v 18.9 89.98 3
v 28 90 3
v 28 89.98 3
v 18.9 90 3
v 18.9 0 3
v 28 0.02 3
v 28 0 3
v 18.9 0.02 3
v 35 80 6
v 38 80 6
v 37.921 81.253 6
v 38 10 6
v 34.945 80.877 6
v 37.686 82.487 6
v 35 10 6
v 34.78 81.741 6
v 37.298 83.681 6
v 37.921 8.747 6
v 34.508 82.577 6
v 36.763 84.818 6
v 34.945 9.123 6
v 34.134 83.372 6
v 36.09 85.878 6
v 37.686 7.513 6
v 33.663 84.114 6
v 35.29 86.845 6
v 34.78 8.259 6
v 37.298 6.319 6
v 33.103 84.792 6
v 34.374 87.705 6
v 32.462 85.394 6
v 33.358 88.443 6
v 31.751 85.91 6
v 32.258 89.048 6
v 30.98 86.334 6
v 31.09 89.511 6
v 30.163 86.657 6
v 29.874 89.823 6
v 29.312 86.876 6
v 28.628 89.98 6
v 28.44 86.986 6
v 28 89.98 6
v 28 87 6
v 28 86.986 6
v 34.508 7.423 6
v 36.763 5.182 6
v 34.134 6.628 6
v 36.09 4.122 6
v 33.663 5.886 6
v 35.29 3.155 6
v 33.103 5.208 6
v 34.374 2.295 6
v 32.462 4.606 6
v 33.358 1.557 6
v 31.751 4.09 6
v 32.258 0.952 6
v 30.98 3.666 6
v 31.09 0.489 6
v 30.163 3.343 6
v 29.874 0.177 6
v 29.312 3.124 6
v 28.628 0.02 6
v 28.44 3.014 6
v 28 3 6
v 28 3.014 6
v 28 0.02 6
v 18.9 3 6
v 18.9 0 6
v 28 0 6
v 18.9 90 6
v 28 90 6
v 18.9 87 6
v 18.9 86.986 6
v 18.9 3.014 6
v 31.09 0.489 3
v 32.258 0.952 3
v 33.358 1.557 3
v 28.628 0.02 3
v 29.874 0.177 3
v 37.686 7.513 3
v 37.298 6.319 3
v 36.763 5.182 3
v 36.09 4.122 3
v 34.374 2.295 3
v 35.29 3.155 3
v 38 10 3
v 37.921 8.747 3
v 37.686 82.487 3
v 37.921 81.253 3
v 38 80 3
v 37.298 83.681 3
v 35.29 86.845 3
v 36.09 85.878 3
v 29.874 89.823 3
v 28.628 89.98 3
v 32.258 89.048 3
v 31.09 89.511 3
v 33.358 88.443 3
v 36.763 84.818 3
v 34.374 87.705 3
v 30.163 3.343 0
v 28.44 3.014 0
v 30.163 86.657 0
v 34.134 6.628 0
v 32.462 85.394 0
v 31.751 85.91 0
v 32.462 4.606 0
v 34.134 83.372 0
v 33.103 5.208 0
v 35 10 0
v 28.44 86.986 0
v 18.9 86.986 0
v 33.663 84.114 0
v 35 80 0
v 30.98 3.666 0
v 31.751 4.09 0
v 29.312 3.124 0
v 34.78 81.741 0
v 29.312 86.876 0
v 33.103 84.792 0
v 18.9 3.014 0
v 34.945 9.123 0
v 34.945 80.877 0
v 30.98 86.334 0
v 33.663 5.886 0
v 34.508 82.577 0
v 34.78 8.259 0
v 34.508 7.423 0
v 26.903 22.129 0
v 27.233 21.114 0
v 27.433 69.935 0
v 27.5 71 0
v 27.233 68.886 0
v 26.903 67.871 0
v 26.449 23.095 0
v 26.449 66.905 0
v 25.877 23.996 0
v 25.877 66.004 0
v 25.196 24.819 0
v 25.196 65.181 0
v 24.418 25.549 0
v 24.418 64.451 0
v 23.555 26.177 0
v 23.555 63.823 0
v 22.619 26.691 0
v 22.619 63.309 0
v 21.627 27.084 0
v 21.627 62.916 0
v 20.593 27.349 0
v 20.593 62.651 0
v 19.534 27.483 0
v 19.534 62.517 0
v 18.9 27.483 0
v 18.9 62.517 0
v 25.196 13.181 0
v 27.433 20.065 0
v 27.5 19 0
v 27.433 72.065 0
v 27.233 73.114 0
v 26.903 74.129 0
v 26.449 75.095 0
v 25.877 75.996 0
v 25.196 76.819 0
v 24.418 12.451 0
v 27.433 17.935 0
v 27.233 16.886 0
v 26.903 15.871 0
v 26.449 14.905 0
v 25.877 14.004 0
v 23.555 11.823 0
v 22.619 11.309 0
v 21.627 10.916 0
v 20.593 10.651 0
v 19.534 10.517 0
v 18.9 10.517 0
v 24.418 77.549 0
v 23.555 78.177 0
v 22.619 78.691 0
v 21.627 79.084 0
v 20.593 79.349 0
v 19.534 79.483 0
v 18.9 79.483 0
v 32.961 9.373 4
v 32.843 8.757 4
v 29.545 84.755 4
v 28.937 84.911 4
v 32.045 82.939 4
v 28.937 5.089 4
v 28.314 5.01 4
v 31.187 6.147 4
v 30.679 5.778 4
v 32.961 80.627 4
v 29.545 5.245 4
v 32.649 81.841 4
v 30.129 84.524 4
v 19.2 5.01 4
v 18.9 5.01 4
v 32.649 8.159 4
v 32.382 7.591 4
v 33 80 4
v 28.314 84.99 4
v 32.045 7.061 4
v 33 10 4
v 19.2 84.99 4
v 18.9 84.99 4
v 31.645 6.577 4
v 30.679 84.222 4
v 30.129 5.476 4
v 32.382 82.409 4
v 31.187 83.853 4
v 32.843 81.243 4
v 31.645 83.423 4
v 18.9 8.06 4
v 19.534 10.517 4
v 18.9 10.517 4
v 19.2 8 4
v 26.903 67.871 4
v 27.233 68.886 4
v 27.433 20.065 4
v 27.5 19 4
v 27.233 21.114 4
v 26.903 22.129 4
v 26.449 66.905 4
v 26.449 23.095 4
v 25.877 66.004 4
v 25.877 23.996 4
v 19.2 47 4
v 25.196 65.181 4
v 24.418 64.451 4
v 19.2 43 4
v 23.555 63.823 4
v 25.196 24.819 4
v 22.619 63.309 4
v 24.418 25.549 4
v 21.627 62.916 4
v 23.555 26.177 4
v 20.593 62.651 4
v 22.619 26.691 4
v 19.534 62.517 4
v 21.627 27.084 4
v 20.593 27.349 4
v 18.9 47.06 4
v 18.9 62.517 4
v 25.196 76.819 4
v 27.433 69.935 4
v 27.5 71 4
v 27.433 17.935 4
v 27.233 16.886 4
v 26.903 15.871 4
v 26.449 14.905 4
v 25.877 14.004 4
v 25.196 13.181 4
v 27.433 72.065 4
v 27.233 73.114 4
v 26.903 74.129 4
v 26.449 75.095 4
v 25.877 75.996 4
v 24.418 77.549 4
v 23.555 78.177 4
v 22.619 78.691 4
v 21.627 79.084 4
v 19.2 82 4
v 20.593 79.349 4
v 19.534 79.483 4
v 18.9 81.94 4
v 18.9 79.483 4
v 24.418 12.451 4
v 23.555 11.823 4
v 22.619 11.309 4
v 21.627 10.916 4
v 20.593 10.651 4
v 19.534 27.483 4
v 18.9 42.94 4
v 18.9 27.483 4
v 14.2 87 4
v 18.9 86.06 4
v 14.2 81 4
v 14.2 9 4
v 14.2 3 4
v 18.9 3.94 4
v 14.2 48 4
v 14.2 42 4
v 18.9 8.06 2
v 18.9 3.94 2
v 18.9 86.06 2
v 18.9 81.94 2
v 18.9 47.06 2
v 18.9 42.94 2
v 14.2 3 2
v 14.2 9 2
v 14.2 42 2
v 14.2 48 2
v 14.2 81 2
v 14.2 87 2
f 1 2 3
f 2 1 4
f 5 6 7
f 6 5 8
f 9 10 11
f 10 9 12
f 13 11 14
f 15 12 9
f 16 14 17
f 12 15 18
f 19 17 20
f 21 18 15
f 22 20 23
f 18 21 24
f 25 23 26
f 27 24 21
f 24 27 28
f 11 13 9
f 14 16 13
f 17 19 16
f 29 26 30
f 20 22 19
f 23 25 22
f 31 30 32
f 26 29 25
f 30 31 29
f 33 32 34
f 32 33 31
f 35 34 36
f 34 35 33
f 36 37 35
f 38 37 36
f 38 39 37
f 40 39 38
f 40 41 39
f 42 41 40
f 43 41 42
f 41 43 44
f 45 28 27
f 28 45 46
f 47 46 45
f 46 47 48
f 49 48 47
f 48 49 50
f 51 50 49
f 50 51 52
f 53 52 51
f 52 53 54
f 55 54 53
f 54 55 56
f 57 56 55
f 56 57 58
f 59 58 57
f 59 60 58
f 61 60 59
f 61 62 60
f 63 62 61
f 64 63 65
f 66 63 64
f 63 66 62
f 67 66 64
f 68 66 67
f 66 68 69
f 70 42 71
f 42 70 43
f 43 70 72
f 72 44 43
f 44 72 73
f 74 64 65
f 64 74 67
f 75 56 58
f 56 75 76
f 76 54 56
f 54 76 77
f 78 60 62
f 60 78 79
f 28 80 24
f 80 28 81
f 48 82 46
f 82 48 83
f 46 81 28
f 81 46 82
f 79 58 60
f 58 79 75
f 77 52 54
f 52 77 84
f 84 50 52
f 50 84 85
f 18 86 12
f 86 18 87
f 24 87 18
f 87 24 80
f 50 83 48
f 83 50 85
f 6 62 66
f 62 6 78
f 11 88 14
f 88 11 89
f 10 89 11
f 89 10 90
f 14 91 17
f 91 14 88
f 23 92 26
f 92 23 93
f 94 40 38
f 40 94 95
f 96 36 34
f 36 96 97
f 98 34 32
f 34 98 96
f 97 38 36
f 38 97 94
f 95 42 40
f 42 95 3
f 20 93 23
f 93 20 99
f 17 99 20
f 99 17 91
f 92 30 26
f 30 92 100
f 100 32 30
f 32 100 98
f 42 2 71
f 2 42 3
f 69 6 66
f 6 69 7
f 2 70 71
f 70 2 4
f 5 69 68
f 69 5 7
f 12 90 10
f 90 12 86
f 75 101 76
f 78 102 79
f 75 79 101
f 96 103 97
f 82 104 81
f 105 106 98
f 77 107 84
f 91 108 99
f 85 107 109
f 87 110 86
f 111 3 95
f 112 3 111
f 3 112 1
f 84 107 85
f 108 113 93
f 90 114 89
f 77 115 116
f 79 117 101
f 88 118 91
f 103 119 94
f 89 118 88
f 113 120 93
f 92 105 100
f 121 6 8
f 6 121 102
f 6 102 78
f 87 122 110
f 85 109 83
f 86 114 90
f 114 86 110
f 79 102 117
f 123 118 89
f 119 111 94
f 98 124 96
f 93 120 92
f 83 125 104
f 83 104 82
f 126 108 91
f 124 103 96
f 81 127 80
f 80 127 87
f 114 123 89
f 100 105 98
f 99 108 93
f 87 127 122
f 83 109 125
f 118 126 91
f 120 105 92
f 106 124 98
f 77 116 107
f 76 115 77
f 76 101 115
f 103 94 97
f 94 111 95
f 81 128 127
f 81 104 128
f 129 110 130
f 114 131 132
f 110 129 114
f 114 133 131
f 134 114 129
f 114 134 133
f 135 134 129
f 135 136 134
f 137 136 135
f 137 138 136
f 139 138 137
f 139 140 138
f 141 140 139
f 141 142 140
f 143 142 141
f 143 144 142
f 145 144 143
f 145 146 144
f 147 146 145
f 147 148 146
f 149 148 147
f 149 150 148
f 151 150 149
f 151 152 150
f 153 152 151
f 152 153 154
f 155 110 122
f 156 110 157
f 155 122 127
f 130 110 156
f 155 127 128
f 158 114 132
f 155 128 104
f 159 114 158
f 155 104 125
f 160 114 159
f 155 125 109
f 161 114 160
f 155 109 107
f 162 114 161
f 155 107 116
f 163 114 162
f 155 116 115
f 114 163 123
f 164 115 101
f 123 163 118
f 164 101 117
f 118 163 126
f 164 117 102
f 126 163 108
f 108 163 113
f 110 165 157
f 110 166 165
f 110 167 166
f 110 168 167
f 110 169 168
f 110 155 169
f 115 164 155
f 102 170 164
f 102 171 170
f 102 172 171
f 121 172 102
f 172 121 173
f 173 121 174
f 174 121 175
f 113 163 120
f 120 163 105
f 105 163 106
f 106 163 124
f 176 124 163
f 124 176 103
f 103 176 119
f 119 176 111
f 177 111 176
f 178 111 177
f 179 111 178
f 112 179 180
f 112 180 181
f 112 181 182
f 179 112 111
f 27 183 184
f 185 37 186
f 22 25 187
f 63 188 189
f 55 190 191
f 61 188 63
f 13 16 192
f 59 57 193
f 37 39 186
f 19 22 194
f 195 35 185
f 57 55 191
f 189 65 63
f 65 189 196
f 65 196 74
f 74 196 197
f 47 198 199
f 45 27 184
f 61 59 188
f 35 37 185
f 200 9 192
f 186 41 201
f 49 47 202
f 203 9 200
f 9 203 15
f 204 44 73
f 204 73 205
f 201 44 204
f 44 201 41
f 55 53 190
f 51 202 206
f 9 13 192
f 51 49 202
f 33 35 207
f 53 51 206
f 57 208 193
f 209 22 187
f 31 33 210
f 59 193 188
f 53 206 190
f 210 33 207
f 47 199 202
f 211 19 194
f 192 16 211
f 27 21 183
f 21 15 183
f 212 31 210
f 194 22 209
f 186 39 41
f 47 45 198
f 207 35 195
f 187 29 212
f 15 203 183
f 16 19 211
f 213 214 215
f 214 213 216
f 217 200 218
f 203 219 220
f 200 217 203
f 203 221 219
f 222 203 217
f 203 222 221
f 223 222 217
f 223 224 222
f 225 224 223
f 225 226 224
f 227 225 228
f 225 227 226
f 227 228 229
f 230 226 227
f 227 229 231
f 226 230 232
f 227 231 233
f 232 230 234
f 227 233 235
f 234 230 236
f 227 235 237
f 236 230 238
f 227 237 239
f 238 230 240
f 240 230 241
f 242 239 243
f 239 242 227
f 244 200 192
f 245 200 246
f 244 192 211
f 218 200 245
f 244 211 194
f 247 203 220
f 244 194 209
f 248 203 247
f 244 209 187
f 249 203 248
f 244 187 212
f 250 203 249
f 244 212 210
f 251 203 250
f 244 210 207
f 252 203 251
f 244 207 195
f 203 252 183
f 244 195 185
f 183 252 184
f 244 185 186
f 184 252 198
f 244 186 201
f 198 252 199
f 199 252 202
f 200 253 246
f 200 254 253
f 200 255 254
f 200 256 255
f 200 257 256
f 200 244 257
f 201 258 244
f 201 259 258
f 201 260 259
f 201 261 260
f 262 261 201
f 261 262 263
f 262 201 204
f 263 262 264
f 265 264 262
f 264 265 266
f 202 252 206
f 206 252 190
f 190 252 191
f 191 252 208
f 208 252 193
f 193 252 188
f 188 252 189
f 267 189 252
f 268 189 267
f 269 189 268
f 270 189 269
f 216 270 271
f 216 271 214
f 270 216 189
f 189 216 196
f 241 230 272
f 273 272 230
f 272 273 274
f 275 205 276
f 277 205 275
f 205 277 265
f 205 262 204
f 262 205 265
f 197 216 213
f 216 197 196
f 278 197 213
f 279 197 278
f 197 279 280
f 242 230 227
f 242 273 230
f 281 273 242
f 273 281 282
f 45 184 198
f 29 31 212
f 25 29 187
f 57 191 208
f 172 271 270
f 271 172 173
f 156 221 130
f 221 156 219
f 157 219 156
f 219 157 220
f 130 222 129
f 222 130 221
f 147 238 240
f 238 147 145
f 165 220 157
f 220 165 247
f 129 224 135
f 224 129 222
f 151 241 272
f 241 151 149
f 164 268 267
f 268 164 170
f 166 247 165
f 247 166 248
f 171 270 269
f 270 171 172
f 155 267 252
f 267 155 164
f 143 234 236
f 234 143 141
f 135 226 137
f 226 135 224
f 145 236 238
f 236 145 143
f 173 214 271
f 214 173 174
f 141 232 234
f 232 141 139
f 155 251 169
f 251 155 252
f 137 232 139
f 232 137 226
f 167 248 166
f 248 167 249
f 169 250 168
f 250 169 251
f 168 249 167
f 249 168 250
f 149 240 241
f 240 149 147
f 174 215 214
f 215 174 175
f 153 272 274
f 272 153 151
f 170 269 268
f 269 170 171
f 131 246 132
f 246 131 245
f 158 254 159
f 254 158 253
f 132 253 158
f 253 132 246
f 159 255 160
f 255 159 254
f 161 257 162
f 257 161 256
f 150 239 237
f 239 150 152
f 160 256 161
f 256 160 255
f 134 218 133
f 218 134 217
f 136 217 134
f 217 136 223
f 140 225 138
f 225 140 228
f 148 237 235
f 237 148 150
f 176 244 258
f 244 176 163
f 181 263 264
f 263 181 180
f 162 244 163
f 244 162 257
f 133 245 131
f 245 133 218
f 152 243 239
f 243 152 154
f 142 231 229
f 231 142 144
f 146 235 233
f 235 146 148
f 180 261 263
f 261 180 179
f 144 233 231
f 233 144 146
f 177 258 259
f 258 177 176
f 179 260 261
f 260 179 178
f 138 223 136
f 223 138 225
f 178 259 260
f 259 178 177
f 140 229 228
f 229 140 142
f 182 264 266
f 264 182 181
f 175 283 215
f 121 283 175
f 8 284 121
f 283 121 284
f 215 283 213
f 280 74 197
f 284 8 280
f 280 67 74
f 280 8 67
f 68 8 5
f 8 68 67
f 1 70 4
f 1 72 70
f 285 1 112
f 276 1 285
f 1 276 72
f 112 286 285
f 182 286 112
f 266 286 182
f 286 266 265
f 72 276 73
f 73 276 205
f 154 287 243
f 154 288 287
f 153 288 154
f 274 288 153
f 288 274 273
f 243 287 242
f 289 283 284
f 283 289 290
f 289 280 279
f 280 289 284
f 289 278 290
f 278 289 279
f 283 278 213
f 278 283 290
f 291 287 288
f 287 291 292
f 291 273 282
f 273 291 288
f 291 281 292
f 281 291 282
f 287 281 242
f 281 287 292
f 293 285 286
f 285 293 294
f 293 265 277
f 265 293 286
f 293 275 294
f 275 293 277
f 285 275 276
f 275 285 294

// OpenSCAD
// file: dining_room_config.scad
use <./_cfg.scad>

// Dining Room Configuration Functions
function get_h() = 6;
function get_width() = 38;
function get_length() = 90;
function get_diameter() = 17;
function get_distance() = 52;
function get_nutDistance() = 6;
function get_separation() = 10;
function get_offset_l() = 0;
function get_offset_r() = 0;
// file: _cfg.scad
// Global configuration functions
function get_fn() = 50;
function get_darft() = false;
// file: base.scad
module base(h, width, length, diameter, distance, offset_l=0, offset_r=0, fn) {
    corner_radius=10;

    difference() {
        union() {
            difference() {
                _base_plate_shape(corner_radius, h, width, length, fn);
                translate([3,3,h-2]) {
                    offset=3;
                    _base_plate_shape(corner_radius-offset, h-2, width-offset*2, length-offset*2, fn);
                }
            }
        }

        translate([width/2, length/2-distance/2, -.1]) {
            translate([offset_l, 0, 0])
            cylinder(d=diameter, h=h+.2, center=false, $fn=fn);
            translate([offset_r, distance, 0]) {
                cylinder(d=diameter, h=h+.2, center=false, $fn=fn);
            }
        }
    }
}

module rounded_top_only(corner_radius, h, width, length, fn) {
    minkowski() {
        _base_plate_shape(corner_radius, h - corner_radius, width, length, fn);
        translate([0, 0, corner_radius]) cylinder(r=corner_radius/2, h=0.001, $fn=fn);
    }
}

module _base_plate_shape(corner_radius, h, width, length, fn) {
    hs=h/2;
    hn=h-hs;

    translate([0, 0, hs])

    union() {
        translate([corner_radius, 0, 0])
            cube([width - corner_radius * 2, length, hn], center=false);

        translate([0, corner_radius, 0])
            cube([width, length - corner_radius * 2, hn], center=false);

        for (x = [corner_radius, width - corner_radius])
        for (y = [corner_radius, length - corner_radius])
        translate([x, y, 0])
            cylinder(d = corner_radius * 2, h = hn, center = false, $fn = fn);

        // -------

        hull() {
            for (x = [corner_radius, width - corner_radius])
            for (y = [corner_radius, length - corner_radius])
            translate([x, y, 0])
                translate([0, 0, -hs])
                    cylinder(r1=corner_radius-hs, r2=corner_radius, h = hs, center = false, $fn = fn);
        }
    }
}

module nut(h,extend=0) {
    nut_height=h;
    nut_width=5+extend;
    nut_length=4+extend;
    nut_length_=1+extend;
    rotate([0,0,90]) {
        translate([-nut_length/2,0,0]) {
            linear_extrude(height=nut_height)
                polygon(points=[[0,0], [-nut_length_,nut_width], [0,nut_width]]);

            translate([nut_length,0,0]) {
                linear_extrude(height=nut_height)
                    polygon(points=[[0,0], [nut_length_,nut_width], [0,nut_width]]);
            }

            cube([nut_length, nut_width, nut_height], center=false);
        }
    }
}

module both(h, width, length, diameter, distance, nutDistance, separation, offset_l=0, offset_r=0, fn) {
    left(h, width, length, diameter, distance, nutDistance, offset_l, offset_r, fn);

    translate([-separation, 0, 0])
        right(h, width, length, diameter, distance, nutDistance, offset_l, offset_r, fn);
}

module left(h, width, length, diameter, distance, nutDistance, offset_l=0, offset_r=0, fn) {
    union() {
        translate([0, 0, 0]) {
            difference() {
                base(h, width, length, diameter, distance, offset_l, offset_r, fn);
                translate([-.1, -.1, -.1]) {
                    cube([width / 2, length + .2, h + .2], center = false);
                }
            }
        }

        translate([0.2,0,2])
            translate([width / 2, 0, 0]) {
                translate([0, nutDistance, 0]) {
                    nut(h - 4);
                }
                translate([0, length / 2, 0]) {
                    nut(h - 4);
                }
                translate([0, length - nutDistance, 0]) {
                    nut(h - 4);
                }
            }
    }
}

module right(h, width, length, diameter, distance, nutDistance, offset_l=0, offset_r=0, fn) {
    difference() {
        union() {
            difference() {
                base(h, width, length, diameter, distance, offset_l, offset_r, fn);
                translate([width / 2 + .1, -.1, -.1]) {
                    cube([width / 2, length + .2, h + .2], center = false);
                }
            }
        }

        translate([0.2,0,1.5])
            translate([width / 2 , 0, -.1]) {
                translate([0, nutDistance, 0]) {
                    nut(h - 1.3, extend = .2);
                }
                translate([0, length / 2, 0]) {
                    nut(h - 1.3, extend = .2);
                }
                translate([0, length - nutDistance, 0]) {
                    nut(h - 1.3, extend =  .2);
                }
            }
    }
}
// main file
use <./base.scad>
use <./_cfg.scad>
use <./dining_room_config.scad>

left(
    h=get_h(),
    width=get_width(),
    length=get_length(),
    diameter=get_diameter(),
    distance=get_distance(),
    nutDistance=get_nutDistance(),
    offset_l=get_offset_l(),
    offset_r=get_offset_r(),
    fn=get_fn()
);
